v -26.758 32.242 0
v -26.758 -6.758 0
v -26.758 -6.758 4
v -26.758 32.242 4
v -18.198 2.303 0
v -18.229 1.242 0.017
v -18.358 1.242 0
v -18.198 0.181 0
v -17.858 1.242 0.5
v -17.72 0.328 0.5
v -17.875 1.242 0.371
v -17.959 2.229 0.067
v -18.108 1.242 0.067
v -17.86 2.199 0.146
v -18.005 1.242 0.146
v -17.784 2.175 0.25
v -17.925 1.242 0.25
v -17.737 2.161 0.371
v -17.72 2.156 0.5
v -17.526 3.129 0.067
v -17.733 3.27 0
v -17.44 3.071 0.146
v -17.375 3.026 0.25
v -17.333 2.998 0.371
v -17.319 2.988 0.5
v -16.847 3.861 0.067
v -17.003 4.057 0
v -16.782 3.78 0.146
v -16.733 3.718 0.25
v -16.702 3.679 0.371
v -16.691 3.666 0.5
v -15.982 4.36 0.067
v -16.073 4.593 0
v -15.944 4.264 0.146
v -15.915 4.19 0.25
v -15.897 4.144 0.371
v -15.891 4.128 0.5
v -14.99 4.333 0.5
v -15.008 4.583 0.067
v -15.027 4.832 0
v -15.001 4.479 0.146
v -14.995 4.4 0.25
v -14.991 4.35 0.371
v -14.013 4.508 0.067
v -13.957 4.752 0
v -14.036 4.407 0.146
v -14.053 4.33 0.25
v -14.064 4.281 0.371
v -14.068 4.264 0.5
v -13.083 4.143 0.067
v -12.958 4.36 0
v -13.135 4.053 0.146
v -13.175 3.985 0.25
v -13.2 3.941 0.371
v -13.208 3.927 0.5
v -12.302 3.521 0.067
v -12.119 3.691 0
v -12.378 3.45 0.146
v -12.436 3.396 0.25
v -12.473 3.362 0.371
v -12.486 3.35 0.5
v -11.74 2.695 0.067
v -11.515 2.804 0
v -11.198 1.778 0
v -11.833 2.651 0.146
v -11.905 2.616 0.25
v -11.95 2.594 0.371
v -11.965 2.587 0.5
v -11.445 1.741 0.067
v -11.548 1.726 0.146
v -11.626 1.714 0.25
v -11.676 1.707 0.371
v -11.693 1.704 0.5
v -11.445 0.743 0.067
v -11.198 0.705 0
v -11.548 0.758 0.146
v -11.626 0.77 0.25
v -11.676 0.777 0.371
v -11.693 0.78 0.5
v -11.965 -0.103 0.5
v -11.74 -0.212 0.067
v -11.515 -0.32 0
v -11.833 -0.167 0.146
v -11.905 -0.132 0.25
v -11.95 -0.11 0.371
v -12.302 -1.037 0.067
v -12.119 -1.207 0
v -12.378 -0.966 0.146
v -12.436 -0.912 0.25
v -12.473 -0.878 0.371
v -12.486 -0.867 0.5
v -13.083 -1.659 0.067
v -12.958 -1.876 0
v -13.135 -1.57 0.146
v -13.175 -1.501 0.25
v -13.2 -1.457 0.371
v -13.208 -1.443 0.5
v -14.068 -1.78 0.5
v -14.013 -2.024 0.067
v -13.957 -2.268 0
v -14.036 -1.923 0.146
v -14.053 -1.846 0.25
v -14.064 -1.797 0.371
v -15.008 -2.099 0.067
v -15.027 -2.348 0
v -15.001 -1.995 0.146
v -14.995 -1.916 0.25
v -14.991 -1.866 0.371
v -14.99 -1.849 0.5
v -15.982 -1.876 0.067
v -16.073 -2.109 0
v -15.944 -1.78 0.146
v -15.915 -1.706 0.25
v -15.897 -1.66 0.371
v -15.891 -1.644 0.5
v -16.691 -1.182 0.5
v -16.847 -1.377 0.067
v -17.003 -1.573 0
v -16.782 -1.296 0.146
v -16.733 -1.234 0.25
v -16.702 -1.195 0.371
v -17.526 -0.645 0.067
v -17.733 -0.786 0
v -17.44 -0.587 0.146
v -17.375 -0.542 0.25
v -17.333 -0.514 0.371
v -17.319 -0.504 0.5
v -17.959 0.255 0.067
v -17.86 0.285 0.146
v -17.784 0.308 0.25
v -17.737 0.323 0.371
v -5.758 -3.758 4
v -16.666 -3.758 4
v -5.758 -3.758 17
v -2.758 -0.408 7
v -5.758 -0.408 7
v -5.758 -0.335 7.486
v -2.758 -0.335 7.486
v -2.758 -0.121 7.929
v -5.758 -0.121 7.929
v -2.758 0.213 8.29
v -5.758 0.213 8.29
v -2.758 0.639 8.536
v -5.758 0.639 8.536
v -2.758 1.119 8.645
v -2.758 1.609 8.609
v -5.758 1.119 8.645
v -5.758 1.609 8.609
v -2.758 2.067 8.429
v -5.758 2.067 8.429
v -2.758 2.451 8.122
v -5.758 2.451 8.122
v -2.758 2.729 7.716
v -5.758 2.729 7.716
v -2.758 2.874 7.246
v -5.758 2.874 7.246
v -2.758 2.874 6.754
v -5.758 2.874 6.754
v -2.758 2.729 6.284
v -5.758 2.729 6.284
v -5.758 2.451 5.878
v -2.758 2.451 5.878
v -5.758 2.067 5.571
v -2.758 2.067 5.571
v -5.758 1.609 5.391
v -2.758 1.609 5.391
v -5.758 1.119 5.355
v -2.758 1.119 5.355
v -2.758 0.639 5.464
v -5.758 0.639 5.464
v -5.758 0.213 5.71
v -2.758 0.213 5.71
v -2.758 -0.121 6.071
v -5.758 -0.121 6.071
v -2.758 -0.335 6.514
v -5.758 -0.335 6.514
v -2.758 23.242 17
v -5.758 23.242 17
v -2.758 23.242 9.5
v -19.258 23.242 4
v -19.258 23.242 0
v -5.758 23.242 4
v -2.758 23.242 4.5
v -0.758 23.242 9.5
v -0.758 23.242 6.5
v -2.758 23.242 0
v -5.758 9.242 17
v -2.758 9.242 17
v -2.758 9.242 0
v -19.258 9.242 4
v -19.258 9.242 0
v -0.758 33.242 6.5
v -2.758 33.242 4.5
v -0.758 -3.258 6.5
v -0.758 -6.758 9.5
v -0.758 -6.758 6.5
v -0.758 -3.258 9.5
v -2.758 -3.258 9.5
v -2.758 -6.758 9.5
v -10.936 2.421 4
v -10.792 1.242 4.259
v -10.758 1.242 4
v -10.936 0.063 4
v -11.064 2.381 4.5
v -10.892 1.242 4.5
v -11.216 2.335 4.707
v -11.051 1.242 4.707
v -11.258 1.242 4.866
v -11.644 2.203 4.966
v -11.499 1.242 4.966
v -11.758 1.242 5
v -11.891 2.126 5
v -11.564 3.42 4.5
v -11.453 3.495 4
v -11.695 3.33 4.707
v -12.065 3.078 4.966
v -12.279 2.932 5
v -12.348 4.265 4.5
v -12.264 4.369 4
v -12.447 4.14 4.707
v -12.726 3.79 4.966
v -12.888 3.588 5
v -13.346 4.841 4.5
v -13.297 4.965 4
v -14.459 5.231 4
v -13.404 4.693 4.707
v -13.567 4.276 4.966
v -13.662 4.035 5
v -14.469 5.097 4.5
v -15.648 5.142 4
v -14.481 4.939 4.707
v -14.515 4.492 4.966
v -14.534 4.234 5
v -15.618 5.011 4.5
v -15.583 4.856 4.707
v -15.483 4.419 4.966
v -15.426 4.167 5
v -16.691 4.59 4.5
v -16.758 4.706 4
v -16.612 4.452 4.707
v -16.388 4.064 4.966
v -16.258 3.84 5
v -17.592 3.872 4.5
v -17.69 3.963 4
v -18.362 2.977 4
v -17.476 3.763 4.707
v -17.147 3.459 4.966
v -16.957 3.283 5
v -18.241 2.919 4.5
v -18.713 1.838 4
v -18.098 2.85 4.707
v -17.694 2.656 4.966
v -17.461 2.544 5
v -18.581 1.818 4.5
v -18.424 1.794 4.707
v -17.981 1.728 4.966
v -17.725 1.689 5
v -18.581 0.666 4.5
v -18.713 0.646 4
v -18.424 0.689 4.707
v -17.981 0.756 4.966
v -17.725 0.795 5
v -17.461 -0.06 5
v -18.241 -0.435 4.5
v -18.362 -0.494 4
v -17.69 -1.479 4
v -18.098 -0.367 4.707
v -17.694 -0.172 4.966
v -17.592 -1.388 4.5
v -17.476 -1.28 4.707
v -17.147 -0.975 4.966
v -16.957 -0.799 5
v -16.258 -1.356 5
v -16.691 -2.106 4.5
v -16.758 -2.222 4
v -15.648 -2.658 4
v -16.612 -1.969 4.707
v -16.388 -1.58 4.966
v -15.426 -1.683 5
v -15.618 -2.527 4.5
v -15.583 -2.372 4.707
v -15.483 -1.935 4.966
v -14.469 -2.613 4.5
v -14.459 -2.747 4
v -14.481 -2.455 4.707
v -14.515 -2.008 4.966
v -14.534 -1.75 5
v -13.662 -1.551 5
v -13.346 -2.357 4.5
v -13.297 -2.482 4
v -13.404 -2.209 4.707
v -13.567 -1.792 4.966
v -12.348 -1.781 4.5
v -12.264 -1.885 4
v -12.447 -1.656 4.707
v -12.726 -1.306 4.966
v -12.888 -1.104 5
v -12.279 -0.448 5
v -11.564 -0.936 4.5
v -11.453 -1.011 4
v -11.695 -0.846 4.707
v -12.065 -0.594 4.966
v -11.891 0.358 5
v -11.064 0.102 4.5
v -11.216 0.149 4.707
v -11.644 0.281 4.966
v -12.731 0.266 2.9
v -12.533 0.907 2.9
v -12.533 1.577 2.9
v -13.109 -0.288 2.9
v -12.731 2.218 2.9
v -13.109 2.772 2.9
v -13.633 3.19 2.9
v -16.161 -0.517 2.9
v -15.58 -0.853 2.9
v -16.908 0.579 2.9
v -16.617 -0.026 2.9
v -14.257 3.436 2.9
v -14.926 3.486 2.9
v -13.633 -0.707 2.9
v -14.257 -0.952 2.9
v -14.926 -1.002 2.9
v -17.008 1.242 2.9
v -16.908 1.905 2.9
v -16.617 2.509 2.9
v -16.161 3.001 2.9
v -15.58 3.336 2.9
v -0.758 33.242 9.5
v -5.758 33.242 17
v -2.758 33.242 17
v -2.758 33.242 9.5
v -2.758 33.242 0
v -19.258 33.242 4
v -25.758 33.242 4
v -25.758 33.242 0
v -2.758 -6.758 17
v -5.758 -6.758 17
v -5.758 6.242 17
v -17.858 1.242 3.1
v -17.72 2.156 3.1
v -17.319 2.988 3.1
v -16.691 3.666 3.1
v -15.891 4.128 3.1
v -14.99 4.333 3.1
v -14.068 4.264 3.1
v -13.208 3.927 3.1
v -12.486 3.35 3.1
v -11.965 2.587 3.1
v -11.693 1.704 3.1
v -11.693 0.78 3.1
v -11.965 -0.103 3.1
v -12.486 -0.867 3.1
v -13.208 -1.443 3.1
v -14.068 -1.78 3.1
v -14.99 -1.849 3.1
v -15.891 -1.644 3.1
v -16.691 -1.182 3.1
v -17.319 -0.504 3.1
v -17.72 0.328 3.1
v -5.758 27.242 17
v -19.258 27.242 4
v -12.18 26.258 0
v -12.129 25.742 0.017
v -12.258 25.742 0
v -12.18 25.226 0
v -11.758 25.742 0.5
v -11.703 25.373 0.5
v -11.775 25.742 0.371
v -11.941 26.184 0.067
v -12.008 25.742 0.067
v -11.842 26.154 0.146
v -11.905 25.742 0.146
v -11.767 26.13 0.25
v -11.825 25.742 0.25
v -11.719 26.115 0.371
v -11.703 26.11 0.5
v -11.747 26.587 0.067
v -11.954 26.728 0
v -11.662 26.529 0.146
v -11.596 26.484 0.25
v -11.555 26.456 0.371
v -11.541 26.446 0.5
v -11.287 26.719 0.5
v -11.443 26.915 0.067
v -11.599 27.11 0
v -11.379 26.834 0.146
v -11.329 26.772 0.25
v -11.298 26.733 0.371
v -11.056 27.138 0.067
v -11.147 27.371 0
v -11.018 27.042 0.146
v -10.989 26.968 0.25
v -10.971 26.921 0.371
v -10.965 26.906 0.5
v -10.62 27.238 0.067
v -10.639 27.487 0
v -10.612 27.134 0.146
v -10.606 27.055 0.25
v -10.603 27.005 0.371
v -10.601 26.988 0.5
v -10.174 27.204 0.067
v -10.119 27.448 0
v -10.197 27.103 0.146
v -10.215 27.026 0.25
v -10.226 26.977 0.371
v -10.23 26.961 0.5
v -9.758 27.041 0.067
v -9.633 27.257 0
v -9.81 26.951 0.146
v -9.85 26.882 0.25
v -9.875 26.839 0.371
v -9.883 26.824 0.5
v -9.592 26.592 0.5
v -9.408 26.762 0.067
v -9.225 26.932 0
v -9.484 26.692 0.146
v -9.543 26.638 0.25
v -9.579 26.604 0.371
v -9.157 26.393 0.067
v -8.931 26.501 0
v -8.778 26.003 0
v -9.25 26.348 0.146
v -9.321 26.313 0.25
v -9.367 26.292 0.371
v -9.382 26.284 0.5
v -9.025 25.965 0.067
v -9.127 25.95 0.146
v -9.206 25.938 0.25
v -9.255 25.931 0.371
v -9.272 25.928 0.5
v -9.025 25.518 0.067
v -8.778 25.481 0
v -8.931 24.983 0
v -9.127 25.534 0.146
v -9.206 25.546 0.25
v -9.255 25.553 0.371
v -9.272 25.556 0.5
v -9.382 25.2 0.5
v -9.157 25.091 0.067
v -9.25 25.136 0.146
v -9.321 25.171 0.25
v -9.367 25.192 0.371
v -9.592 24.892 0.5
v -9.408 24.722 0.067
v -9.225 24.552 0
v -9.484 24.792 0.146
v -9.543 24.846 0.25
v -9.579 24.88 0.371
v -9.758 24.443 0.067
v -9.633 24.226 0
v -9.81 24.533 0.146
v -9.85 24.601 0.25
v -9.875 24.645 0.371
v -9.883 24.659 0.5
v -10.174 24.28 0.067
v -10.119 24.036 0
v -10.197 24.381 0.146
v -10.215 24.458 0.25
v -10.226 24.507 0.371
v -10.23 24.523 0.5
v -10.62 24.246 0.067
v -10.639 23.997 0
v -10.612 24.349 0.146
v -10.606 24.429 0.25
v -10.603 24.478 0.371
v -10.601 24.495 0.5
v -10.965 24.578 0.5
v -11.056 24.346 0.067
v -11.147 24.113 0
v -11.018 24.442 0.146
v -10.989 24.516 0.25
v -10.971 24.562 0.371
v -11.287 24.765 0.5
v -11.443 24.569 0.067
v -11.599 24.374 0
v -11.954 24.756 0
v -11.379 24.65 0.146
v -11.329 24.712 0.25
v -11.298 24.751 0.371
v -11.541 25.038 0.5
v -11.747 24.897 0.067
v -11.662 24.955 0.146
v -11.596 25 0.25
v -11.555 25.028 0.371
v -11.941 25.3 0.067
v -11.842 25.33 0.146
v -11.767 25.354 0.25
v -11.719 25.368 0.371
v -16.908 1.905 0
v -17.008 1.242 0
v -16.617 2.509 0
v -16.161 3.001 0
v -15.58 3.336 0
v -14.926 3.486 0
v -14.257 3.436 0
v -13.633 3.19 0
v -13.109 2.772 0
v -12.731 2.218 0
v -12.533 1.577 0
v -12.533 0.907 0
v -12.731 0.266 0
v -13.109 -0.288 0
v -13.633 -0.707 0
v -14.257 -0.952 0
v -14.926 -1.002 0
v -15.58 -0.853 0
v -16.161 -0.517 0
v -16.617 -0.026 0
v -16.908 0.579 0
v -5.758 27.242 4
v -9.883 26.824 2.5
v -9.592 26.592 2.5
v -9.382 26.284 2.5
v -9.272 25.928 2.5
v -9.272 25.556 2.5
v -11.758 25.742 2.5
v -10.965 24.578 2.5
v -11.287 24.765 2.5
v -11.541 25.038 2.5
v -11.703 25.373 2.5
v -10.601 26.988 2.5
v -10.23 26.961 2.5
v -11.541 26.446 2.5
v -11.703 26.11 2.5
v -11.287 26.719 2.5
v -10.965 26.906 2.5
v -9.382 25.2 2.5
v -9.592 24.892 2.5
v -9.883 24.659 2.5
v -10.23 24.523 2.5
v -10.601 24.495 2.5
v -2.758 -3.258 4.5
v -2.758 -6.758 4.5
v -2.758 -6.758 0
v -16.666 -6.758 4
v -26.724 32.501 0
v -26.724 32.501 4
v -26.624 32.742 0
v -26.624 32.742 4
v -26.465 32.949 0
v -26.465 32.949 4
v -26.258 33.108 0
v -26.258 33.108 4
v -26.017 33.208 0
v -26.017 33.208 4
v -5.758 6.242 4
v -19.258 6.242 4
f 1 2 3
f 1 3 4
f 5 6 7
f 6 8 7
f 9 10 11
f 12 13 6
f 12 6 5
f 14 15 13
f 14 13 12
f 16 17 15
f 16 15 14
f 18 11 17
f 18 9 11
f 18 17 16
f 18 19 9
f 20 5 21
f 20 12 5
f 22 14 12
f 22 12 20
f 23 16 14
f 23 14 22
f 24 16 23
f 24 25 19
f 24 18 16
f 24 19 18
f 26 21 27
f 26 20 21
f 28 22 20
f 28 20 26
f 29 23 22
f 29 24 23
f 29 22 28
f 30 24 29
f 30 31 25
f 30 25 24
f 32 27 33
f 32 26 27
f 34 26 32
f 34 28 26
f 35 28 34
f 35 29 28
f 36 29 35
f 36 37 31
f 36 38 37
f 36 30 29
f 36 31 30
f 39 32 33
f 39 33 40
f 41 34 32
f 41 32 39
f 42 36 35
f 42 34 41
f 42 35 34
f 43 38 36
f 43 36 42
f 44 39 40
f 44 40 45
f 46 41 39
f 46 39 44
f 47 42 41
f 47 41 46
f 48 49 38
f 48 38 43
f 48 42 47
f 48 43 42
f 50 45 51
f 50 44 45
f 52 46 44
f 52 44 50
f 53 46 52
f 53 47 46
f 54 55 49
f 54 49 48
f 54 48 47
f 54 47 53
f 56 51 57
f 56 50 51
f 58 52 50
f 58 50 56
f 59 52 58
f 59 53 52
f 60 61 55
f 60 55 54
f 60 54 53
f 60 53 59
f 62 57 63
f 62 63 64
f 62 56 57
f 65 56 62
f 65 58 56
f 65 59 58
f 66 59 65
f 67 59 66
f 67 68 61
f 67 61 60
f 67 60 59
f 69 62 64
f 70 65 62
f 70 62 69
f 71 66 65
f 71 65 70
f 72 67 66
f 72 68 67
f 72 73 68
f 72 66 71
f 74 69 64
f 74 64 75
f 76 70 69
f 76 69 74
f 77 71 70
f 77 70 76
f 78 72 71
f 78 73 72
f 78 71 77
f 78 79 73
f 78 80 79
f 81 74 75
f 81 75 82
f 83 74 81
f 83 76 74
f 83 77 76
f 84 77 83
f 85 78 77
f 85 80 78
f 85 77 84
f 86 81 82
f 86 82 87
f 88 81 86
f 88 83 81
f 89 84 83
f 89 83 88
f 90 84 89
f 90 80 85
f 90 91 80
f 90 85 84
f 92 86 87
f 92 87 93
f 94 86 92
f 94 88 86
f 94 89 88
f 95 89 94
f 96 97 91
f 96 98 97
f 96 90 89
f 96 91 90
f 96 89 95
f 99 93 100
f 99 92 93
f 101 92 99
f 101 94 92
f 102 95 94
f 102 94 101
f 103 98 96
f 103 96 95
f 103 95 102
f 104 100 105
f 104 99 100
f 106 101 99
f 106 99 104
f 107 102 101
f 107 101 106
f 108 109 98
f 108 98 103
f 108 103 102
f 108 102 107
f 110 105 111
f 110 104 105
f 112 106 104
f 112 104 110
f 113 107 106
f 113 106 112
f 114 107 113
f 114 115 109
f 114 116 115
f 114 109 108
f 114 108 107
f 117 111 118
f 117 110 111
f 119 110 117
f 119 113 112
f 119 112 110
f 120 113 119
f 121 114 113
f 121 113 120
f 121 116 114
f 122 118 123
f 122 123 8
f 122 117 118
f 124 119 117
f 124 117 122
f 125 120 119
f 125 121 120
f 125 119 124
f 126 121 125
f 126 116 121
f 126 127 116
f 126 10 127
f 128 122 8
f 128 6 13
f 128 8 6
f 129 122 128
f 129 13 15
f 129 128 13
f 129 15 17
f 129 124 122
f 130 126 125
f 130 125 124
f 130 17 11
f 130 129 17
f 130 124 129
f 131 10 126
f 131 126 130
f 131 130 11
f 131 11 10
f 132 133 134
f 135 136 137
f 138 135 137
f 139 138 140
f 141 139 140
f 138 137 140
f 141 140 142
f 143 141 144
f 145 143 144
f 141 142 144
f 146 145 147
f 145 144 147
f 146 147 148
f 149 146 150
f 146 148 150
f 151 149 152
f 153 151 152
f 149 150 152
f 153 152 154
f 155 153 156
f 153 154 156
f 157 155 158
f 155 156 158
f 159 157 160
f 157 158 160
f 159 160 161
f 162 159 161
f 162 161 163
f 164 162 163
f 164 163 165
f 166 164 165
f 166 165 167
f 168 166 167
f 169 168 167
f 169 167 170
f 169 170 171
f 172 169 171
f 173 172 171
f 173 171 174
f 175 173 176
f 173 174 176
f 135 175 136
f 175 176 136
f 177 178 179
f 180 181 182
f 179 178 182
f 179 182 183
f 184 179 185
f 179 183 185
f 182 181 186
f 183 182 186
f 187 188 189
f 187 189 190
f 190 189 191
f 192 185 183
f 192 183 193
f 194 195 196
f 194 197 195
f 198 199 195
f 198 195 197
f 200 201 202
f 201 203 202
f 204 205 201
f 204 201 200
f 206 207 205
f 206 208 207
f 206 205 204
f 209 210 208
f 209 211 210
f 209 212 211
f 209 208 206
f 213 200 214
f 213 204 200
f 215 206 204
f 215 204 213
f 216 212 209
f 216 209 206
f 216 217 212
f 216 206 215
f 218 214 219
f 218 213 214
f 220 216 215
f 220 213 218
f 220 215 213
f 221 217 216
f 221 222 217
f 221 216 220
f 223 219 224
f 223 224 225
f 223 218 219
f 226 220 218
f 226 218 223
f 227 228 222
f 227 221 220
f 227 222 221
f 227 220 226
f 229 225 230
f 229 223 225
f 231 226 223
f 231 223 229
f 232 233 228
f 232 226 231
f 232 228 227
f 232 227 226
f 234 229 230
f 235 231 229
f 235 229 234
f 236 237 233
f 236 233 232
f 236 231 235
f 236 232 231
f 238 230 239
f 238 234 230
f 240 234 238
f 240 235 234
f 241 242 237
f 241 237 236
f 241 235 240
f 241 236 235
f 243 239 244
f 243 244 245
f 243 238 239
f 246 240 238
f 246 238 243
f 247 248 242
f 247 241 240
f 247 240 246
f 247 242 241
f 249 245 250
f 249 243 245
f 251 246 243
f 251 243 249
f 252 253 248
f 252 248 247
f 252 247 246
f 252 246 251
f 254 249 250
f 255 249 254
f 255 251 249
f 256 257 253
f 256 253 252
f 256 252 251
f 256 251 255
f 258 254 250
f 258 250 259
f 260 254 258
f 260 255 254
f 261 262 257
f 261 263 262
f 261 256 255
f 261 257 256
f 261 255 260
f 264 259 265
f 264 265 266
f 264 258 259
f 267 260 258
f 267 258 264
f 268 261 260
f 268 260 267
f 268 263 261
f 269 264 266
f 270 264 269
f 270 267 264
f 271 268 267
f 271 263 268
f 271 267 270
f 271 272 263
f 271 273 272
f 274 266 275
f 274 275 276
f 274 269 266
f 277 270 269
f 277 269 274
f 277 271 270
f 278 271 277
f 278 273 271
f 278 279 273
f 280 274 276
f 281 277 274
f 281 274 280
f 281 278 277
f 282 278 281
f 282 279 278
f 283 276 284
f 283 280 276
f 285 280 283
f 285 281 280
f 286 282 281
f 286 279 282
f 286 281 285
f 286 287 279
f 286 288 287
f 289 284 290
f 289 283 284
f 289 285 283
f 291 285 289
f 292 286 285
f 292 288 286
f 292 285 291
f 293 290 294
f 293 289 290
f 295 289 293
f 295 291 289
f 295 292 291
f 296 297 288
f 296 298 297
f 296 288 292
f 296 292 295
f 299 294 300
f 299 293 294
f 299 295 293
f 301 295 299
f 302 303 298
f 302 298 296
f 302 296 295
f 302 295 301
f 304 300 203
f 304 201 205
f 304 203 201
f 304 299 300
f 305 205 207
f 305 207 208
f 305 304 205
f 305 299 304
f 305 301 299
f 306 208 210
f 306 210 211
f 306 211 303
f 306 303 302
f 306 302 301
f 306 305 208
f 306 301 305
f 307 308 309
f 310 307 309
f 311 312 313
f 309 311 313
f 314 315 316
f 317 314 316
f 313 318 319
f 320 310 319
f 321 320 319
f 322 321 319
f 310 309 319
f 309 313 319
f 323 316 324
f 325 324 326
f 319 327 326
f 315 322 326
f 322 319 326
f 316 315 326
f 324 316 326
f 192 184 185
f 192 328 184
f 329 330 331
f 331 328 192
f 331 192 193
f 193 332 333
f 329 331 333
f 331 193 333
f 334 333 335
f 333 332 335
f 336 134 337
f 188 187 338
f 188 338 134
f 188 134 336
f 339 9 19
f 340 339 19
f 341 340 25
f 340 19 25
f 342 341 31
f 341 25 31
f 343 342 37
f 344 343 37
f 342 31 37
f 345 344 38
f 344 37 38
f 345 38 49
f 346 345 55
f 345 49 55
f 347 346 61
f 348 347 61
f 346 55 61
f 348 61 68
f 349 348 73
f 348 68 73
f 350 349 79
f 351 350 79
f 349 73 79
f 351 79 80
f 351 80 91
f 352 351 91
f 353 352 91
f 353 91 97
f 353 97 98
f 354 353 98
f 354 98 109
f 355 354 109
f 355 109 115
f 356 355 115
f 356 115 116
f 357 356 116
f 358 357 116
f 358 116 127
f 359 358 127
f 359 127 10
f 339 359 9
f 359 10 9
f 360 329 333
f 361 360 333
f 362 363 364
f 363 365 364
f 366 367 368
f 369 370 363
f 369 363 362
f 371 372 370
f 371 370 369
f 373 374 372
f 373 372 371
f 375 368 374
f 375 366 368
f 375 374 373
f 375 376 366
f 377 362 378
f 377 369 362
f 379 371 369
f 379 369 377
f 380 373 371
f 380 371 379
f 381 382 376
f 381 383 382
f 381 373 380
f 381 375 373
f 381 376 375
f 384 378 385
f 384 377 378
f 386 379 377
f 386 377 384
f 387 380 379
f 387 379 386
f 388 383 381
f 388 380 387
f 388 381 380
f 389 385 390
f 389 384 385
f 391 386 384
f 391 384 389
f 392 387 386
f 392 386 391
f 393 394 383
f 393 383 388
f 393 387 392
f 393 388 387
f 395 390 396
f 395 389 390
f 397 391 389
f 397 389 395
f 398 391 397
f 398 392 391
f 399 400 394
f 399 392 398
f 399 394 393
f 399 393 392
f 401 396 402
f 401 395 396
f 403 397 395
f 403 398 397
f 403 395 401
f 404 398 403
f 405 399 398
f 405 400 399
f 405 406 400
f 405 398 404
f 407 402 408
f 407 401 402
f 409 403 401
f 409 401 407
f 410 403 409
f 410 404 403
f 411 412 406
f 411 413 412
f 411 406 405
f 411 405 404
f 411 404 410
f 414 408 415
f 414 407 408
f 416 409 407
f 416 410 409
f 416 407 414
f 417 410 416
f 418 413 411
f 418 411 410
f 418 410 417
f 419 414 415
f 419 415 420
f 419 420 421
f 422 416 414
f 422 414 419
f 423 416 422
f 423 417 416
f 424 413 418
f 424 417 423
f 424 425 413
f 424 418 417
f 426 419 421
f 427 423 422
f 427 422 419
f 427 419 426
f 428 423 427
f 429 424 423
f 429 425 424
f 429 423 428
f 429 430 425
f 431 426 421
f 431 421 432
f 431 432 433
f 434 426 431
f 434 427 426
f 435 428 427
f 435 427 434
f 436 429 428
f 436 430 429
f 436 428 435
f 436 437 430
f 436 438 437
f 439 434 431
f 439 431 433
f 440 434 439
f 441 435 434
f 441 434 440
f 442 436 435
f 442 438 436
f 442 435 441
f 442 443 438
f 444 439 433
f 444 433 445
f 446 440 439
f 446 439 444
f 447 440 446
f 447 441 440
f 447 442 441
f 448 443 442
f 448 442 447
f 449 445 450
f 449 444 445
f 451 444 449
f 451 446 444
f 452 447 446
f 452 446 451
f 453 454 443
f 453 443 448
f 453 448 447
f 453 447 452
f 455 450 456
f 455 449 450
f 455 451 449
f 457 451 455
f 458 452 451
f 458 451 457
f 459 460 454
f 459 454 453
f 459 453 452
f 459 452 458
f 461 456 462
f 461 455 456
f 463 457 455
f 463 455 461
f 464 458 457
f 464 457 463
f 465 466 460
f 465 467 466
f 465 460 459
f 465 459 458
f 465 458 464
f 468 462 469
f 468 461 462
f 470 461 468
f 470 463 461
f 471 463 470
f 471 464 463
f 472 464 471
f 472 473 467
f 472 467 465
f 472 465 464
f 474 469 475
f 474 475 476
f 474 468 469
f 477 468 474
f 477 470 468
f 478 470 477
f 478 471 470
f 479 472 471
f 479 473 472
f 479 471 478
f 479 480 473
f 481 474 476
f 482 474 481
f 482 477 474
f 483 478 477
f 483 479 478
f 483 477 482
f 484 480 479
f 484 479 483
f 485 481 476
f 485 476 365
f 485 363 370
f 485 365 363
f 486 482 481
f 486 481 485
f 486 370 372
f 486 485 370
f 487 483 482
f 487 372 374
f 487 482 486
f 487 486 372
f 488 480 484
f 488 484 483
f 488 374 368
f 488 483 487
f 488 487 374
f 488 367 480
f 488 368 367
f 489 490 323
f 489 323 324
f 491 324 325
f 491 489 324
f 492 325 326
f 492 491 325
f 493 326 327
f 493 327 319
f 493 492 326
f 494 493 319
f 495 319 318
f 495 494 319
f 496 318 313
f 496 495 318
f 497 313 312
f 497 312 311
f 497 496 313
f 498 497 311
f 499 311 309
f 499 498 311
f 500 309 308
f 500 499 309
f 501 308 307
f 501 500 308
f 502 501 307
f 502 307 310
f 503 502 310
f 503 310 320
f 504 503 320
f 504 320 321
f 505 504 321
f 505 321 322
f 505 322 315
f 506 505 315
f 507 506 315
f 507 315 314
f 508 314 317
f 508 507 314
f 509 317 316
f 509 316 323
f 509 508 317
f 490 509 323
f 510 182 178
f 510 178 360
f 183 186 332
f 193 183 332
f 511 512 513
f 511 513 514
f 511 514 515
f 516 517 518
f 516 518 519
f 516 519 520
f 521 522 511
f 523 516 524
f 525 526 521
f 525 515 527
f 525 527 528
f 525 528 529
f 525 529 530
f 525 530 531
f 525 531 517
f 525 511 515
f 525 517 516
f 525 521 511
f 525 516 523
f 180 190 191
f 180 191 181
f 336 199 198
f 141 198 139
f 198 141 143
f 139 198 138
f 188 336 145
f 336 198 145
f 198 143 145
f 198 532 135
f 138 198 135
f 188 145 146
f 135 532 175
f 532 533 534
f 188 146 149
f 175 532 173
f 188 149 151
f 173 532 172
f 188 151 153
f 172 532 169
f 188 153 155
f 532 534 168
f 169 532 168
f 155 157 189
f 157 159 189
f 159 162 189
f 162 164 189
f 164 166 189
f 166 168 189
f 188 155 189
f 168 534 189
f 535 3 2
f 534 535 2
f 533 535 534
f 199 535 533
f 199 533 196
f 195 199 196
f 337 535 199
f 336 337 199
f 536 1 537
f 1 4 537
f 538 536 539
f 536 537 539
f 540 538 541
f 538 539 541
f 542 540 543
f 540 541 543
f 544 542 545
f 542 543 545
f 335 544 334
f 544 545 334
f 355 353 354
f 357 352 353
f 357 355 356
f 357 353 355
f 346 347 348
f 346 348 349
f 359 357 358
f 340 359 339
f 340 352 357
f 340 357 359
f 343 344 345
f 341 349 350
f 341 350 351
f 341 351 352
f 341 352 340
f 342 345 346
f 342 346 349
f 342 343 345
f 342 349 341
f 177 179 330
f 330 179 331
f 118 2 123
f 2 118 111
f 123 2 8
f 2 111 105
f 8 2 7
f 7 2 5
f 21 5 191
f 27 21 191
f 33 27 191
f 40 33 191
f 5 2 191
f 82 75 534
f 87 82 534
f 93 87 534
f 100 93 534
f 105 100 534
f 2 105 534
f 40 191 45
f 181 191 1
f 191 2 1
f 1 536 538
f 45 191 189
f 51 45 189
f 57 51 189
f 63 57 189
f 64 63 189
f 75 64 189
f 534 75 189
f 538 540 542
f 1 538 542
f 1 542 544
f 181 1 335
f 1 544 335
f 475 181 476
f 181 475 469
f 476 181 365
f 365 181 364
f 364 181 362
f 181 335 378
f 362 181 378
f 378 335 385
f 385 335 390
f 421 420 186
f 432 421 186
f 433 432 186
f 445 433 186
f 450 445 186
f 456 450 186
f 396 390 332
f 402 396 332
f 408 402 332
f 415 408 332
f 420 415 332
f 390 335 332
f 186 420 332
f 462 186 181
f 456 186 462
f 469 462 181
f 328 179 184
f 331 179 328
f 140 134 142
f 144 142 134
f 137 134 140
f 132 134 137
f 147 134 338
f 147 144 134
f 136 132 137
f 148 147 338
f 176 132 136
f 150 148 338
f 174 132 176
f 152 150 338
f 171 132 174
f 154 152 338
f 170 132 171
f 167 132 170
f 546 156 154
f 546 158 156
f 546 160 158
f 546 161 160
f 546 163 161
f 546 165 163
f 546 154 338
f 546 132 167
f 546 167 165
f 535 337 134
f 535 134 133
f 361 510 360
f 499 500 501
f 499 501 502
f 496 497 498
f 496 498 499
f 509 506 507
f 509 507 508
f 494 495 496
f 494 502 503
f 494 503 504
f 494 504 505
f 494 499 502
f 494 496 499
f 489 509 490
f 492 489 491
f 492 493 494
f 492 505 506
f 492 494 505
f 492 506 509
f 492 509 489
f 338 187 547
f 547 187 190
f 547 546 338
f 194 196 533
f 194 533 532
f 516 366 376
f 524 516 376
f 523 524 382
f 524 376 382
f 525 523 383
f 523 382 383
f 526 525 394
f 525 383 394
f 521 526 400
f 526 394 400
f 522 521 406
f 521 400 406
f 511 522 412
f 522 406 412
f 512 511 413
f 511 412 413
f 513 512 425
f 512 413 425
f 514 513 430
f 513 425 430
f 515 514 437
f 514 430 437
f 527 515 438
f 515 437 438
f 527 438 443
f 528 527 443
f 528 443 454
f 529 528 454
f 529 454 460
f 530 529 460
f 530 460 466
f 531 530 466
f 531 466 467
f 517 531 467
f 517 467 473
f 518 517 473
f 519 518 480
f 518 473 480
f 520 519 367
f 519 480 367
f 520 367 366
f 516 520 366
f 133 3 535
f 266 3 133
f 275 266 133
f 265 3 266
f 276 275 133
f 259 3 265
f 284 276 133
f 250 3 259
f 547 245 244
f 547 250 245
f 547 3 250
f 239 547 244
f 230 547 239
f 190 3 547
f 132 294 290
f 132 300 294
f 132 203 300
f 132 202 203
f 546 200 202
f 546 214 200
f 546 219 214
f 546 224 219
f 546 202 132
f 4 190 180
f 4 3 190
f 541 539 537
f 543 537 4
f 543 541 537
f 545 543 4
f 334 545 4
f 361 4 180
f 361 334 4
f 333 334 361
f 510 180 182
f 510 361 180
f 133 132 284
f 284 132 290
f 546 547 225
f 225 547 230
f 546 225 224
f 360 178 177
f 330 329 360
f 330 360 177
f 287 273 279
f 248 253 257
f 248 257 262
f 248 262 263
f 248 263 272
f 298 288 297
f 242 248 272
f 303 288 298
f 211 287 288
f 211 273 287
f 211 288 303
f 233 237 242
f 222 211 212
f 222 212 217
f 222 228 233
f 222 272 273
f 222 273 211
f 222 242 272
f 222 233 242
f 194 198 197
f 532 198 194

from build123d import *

# Parameters (mm, degrees)
SKETCH1_W               = 24
SKETCH1_H               = 40
BOSS_EXTRUDE1_DEPTH     = 4
FILLET1_R               = 1
CUT_EXTRUDE2_DEPTH      = 43.860474698
CUT_EXTRUDE2_DEPTH_BACK = 43.860474698
SKETCH3_W               = 16.5
SKETCH3_H               = 14
SKETCH5_W               = 3
SKETCH5_H               = 16
BOSS_EXTRUDE2_DEPTH     = 13
BOSS_EXTRUDE3_DEPTH     = 3
BOSS_EXTRUDE4_DEPTH     = 3
SKETCH8_R               = 1.65
CUT_EXTRUDE4_DEPTH      = 3
SKETCH9_W               = 3
SKETCH9_H               = 10
BOSS_EXTRUDE5_DEPTH     = 13
BOSS_EXTRUDE6_DEPTH     = 6
SKETCH11_W              = 5
SKETCH11_H              = 10
BOSS_EXTRUDE7_DEPTH     = 2
CHAMFER1_SIZE           = 2
SKETCH12_R              = 3.1
CUT_EXTRUDE5_DEPTH      = 3.1
SKETCH17_R              = 4
BOSS_EXTRUDE8_DEPTH     = 1
FILLET3_R               = 1
SKETCH21_R              = 2.25
BOSS_EXTRUDE11_DEPTH    = 2.9
SKETCH23_W              = 5
SKETCH23_H              = 3.5
BOSS_EXTRUDE12_DEPTH    = 2
CHAMFER2_SIZE           = 2
FILLET6_R               = 0.5
SKETCH24_R              = 1.25
CUT_EXTRUDE6_DEPTH      = 2.5
FILLET7_R               = 0.5


with BuildPart() as part:
    # Sketch1 → Boss-Extrude1 (new body)
    with BuildSketch(Plane.XY):
        with Locations((-14.758064516, 13.241935484)):
            Rectangle(SKETCH1_W, SKETCH1_H)
    extrude(amount=BOSS_EXTRUDE1_DEPTH)

    # Fillet1
    fillet1_edges = [part.edges().sort_by_distance(p)[0] for p in [
        (-26.758064516, 33.241935484, 2),
    ]]
    fillet(fillet1_edges, radius=FILLET1_R)

    # Sketch3 → Cut-Extrude2 (cut, two sides: drawn at the far end of the back side and taken through both)
    with BuildSketch(Plane(origin=(0, 0, 0), x_dir=(-1, 0, 0), z_dir=(0, 0, -1)).offset(-CUT_EXTRUDE2_DEPTH_BACK)):
        with Locations((11.008064516, 16.241935484)):
            Rectangle(SKETCH3_W, SKETCH3_H)
    extrude(amount=CUT_EXTRUDE2_DEPTH + CUT_EXTRUDE2_DEPTH_BACK, mode=Mode.SUBTRACT)

    # Sketch5 → Boss-Extrude2 (add)
    with BuildSketch(Plane.XY.offset(4)):
        with Locations((-4.258064516, 1.241935484)):
            Rectangle(SKETCH5_W, SKETCH5_H)
    extrude(amount=BOSS_EXTRUDE2_DEPTH)

    # Sketch6 → Boss-Extrude3 (add)
    with BuildSketch(Plane.XZ.offset(6.758064516)):
        Polygon((-5.758064516, 17), (-16.666359721, 4), (-5.758064516, 4), align=None)
    extrude(amount=-BOSS_EXTRUDE3_DEPTH)

    # Sketch7 → Boss-Extrude4 (add)
    with BuildSketch(Plane(origin=(0, 9.241935484, 0), x_dir=(1, 0, 0), z_dir=(0, 1, 0))):
        Polygon((-5.758064516, -17), (-19.258064516, -4), (-5.758064516, -4), align=None)
    extrude(amount=-BOSS_EXTRUDE4_DEPTH)

    # Sketch8 → Cut-Extrude4 (cut)
    with BuildSketch(Plane.ZY.offset(5.758064516)):
        with Locations(Location((7, 1.241935484, 0), (0, 0, 270))):
            Circle(SKETCH8_R)
    extrude(amount=-CUT_EXTRUDE4_DEPTH, mode=Mode.SUBTRACT)

    # Sketch9 → Boss-Extrude5 (add)
    with BuildSketch(Plane.XY.offset(4)):
        with Locations((-4.258064516, 28.241935484)):
            Rectangle(SKETCH9_W, SKETCH9_H)
    extrude(amount=BOSS_EXTRUDE5_DEPTH)

    # Sketch10 → Boss-Extrude6 (add)
    with BuildSketch(Plane(origin=(0, 33.241935484, 0), x_dir=(1, 0, 0), z_dir=(0, 1, 0))):
        Polygon((-5.758064516, -17), (-19.258064516, -4), (-5.758064516, -4), align=None)
    extrude(amount=-BOSS_EXTRUDE6_DEPTH)

    # Sketch11 → Boss-Extrude7 (add)
    with BuildSketch(Plane(origin=(-2.758064516, 0, 0), x_dir=(0, 0, -1), z_dir=(1, 0, 0))):
        with Locations((-7, 28.241935484)):
            Rectangle(SKETCH11_W, SKETCH11_H)
    extrude(amount=BOSS_EXTRUDE7_DEPTH)

    # Chamfer1
    chamfer1_edges = [part.edges().sort_by_distance(p)[0] for p in [
        (-0.758064516, 28.241935484, 4.5),
    ]]
    chamfer(chamfer1_edges, length=CHAMFER1_SIZE - 0.0001)  # a hair under: the kernel refuses the full size

    # Sketch12 → Cut-Extrude5 (cut)
    with BuildSketch(Plane(origin=(0, 0, 0), x_dir=(-1, 0, 0), z_dir=(0, 0, -1))):
        with Locations((14.758064516, 1.241935484)):
            Circle(SKETCH12_R)
    extrude(amount=-CUT_EXTRUDE5_DEPTH, mode=Mode.SUBTRACT)

    # Sketch17 → Boss-Extrude8 (add)
    with BuildSketch(Plane.XY.offset(4)):
        with Locations((-14.758064516, 1.241935484)):
            Circle(SKETCH17_R)
    extrude(amount=BOSS_EXTRUDE8_DEPTH)

    # Fillet3
    fillet3_edges = [part.edges().sort_by_distance(p)[0] for p in [
        (-18.758064516, 1.241935484, 5),
    ]]
    fillet(fillet3_edges, radius=FILLET3_R - 0.0001)  # a hair under: the kernel refuses the full size

    # Sketch23 → Boss-Extrude12 (add)
    with BuildSketch(Plane(origin=(-2.758064516, 0, 0), x_dir=(0, 0, -1), z_dir=(1, 0, 0))):
        with Locations((-7, -5.008064516)):
            Rectangle(SKETCH23_W, SKETCH23_H)
    extrude(amount=BOSS_EXTRUDE12_DEPTH)

    # Chamfer2
    chamfer2_edges = [part.edges().sort_by_distance(p)[0] for p in [
        (-0.758064516, -5.008064516, 4.5),
    ]]
    chamfer(chamfer2_edges, length=CHAMFER2_SIZE - 0.0001)  # a hair under: the kernel refuses the full size

    # Fillet6
    fillet6_edges = [part.edges().sort_by_distance(p)[0] for p in [
        (-11.658064516, 1.241935484, 0),
    ]]
    fillet(fillet6_edges, radius=FILLET6_R)

    # Sketch24 → Cut-Extrude6 (cut)
    with BuildSketch(Plane(origin=(0, 0, 0), x_dir=(-1, 0, 0), z_dir=(0, 0, -1))):
        with Locations((10.508064516, 25.741935484)):
            Circle(SKETCH24_R)
    extrude(amount=-CUT_EXTRUDE6_DEPTH, mode=Mode.SUBTRACT)

    # Fillet7
    fillet7_edges = [part.edges().sort_by_distance(p)[0] for p in [
        (-9.258064516, 25.741935484, 0),
    ]]
    fillet(fillet7_edges, radius=FILLET7_R)


with BuildPart() as body_2:
    # Sketch21 → Boss-Extrude11 (new body)
    with BuildSketch(Plane(origin=(0, 0, 0), x_dir=(-1, 0, 0), z_dir=(0, 0, -1))):
        with Locations((14.758064516, 1.241935484)):
            Circle(SKETCH21_R)
    extrude(amount=-BOSS_EXTRUDE11_DEPTH)


solid = Compound([part.part, body_2.part])
